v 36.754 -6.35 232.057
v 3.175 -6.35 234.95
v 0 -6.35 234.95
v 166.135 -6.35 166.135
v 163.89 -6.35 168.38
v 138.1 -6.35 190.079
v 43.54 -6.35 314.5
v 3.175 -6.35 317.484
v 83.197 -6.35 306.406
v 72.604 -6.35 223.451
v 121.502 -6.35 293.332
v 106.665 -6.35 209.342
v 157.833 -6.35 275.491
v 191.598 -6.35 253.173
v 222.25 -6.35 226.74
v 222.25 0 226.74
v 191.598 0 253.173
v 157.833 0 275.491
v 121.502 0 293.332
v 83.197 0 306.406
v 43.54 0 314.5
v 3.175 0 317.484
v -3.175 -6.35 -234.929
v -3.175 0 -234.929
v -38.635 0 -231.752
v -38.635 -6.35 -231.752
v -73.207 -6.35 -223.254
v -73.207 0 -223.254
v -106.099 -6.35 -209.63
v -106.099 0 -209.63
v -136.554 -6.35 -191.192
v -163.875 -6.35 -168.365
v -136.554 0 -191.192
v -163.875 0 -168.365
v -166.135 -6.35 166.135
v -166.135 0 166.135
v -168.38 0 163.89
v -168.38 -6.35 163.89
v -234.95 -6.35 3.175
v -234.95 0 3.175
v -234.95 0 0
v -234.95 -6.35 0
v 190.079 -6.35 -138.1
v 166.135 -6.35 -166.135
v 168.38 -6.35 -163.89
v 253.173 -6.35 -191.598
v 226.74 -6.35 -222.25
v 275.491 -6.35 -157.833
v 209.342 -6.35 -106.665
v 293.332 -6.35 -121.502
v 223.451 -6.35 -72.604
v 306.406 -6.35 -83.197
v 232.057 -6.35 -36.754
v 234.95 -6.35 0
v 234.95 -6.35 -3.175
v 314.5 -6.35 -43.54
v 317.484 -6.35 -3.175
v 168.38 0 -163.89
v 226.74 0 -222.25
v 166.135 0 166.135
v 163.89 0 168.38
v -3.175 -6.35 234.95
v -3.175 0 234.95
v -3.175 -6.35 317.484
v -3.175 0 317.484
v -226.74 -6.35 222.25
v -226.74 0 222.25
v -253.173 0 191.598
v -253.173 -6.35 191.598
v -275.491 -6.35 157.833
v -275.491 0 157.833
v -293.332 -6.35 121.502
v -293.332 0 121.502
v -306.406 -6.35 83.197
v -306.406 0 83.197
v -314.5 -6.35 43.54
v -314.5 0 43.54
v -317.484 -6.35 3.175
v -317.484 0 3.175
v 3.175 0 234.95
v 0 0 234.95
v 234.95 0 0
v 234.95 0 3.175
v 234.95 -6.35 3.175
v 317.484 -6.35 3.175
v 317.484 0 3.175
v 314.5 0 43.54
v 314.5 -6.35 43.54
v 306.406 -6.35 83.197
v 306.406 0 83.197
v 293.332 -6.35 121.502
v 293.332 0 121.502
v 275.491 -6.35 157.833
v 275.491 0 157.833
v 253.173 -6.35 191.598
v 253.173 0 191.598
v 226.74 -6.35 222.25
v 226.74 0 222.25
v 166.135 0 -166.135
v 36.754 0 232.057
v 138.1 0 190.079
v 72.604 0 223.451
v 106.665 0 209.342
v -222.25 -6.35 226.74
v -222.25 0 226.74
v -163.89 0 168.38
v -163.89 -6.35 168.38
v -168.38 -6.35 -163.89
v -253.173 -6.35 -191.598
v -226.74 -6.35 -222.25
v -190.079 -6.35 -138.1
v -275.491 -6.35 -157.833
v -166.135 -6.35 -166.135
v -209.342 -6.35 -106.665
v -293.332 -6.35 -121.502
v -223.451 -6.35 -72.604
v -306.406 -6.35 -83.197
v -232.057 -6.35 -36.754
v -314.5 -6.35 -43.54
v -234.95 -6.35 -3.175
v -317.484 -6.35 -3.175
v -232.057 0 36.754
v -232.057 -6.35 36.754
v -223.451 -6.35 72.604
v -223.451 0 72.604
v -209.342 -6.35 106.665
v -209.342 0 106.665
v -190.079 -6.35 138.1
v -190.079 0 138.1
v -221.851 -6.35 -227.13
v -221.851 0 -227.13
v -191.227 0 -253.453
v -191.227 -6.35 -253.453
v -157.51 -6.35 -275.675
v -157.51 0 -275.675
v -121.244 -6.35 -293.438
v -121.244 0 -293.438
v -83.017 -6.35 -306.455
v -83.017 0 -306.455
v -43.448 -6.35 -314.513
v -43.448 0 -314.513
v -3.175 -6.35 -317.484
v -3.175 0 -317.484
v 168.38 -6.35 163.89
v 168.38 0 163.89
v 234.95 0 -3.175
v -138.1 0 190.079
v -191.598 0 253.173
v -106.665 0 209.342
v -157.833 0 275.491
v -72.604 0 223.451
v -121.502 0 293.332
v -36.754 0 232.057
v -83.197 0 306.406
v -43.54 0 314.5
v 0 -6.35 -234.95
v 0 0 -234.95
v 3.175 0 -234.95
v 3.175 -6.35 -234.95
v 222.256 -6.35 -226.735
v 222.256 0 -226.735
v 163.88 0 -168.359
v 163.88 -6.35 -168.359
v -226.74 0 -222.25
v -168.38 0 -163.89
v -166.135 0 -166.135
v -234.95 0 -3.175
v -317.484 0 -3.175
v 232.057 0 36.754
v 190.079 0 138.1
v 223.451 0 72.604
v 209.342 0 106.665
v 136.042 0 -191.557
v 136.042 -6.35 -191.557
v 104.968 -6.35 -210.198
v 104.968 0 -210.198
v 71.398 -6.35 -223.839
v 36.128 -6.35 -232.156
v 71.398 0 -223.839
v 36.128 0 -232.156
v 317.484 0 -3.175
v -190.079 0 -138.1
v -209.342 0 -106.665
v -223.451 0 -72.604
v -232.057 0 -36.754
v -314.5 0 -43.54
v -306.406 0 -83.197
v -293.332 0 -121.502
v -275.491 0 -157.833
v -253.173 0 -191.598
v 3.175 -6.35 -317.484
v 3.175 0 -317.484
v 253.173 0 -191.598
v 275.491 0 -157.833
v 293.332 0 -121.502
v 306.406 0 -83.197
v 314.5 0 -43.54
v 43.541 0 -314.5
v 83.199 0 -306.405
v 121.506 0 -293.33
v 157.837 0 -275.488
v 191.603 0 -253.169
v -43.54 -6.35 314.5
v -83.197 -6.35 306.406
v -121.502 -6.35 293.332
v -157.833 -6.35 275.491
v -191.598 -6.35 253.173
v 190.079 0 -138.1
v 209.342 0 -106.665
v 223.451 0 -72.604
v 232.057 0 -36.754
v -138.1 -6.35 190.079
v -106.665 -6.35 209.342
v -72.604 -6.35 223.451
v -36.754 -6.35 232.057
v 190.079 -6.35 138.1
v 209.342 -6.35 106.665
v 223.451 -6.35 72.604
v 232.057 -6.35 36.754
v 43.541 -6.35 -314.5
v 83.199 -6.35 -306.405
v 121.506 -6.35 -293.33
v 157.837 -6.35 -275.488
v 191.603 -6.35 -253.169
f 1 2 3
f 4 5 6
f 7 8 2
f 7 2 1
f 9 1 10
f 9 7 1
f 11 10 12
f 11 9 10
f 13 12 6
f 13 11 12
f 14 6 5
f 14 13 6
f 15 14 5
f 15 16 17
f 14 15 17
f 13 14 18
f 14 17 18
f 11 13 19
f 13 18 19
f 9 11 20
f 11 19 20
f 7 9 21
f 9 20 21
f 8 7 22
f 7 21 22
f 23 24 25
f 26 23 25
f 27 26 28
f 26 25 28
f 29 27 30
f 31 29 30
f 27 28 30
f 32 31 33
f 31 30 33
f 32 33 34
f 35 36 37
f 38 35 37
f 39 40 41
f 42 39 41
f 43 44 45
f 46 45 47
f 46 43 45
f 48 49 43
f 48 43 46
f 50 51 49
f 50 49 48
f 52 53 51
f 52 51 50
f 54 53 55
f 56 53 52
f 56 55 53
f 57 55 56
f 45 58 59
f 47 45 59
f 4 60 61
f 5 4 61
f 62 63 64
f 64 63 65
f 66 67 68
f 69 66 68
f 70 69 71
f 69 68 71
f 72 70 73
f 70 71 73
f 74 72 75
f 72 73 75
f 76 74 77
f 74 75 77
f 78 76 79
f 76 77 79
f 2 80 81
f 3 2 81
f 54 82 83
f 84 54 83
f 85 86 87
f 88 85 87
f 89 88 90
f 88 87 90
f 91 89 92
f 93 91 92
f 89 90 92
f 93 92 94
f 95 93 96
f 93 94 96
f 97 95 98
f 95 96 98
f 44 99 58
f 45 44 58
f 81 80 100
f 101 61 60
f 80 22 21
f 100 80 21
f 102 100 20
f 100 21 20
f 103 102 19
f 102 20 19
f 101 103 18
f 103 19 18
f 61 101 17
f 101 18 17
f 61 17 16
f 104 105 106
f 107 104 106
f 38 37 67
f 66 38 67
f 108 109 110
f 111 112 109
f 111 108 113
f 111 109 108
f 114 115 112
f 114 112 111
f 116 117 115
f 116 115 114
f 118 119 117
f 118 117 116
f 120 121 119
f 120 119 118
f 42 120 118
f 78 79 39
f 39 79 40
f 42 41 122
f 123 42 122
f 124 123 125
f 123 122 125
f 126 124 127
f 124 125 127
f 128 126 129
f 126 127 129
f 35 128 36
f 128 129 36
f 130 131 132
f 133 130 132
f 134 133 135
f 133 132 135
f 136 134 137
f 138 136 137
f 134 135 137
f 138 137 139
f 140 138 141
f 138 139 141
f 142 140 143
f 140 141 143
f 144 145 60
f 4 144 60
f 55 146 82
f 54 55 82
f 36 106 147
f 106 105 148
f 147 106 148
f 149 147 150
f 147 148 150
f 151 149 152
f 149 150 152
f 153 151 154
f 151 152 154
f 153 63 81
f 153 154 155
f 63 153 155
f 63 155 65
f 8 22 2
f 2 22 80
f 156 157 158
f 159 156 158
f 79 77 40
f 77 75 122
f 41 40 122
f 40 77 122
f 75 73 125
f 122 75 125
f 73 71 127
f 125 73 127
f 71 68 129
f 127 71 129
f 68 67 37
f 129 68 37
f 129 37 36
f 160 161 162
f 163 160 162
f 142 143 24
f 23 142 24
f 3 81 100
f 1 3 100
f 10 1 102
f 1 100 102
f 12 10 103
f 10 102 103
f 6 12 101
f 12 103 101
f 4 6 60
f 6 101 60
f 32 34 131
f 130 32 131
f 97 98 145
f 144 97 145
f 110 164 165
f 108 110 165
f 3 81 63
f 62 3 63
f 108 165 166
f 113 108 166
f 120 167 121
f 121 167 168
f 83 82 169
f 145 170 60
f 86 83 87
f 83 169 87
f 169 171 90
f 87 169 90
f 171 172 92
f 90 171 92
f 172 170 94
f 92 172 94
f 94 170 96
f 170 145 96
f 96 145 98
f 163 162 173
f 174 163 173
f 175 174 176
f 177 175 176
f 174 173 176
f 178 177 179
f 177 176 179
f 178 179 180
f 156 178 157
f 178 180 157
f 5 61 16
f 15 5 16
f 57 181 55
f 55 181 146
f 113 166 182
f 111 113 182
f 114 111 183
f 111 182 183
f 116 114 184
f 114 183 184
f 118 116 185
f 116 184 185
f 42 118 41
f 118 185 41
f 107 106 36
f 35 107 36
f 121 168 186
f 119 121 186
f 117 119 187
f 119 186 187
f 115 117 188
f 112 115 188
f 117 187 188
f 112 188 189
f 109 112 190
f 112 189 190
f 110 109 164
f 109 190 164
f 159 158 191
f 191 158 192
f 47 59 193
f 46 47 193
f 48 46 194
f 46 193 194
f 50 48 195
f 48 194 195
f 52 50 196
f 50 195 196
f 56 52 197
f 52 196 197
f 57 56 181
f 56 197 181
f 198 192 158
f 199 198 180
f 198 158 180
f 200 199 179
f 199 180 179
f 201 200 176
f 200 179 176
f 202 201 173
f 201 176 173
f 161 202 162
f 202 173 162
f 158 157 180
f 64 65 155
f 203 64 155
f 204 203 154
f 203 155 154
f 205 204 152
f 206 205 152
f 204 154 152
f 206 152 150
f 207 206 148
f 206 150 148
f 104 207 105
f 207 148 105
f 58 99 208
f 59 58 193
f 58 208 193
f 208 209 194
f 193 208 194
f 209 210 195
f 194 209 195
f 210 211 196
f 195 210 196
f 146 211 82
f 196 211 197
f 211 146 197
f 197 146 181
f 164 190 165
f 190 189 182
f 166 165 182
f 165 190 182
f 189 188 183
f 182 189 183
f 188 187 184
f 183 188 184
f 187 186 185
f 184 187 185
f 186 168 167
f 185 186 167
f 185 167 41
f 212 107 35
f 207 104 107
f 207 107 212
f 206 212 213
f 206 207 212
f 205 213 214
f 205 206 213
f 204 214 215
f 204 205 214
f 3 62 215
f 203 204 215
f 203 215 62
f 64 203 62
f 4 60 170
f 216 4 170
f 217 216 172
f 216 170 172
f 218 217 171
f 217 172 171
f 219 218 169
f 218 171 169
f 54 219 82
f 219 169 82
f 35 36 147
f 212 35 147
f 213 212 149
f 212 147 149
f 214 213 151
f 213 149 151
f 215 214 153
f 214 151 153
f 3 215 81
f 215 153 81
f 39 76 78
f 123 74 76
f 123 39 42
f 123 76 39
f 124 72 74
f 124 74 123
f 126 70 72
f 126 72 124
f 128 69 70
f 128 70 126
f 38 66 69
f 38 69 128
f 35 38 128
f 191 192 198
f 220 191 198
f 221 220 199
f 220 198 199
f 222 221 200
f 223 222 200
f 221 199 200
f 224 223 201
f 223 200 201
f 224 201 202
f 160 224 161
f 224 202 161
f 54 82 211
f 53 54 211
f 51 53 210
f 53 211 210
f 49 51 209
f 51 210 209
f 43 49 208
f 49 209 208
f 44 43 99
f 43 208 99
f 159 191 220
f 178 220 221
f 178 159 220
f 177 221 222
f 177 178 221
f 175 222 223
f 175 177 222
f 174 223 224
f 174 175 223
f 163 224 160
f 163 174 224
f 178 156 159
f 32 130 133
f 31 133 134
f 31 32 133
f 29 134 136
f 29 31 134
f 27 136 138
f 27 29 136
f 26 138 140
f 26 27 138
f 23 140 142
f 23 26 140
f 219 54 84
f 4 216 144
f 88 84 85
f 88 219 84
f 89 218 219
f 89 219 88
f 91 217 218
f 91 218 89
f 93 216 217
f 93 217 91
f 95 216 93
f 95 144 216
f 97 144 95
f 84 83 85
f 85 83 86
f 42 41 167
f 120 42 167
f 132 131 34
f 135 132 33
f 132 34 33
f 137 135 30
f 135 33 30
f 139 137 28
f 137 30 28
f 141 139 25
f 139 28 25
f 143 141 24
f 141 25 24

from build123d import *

# Parameters (mm, degrees)
F1_DEPTH = 6.35


with BuildPart() as f1:
    # F0 (on Front) → F1 (new body)
    with BuildSketch(Plane.XZ):
        with BuildLine():
            Line((234.95, -3.175), (234.95, 0))
            ThreePointArc((234.95, 0), (217.0654961635, -89.9114724342), (166.1347382398, -166.1347382398))
            Line((166.1347382398, -166.1347382398), (168.37980227, -163.8896742095))
            Line((168.37980227, -163.8896742095), (226.7402414562, -222.2501133957))
            ThreePointArc((226.7402414562, -222.2501133957), (293.3317515723, -121.5019897759), (317.4841246031, -3.175))
            Line((317.4841246031, -3.175), (234.95, -3.175))
        make_face()
    extrude(amount=F1_DEPTH)


with BuildPart() as f1b:
    # F0 (on Front) → F1, piece 2 (new body)
    with BuildSketch(Plane.XZ):
        with BuildLine():
            ThreePointArc((166.1347382398, 166.1347382398), (217.0654961635, 89.9114724342), (234.95, 0))
            Line((234.95, 0), (234.95, 3.175))
            Line((234.95, 3.175), (317.4841246031, 3.175))
            ThreePointArc((317.4841246031, 3.175), (293.3317515723, 121.5019897759), (226.7402414562, 222.2501133957))
            Line((226.7402414562, 222.2501133957), (168.37980227, 163.8896742095))
            Line((168.37980227, 163.8896742095), (166.1347382398, 166.1347382398))
        make_face()
    extrude(amount=F1_DEPTH)


with BuildPart() as f1c:
    # F0 (on Front) → F1, piece 3 (new body)
    with BuildSketch(Plane.XZ):
        with BuildLine():
            ThreePointArc((0, 234.95), (89.9114724342, 217.0654961635), (166.1347382398, 166.1347382398))
            Line((166.1347382398, 166.1347382398), (163.8896742095, 168.37980227))
            Line((163.8896742095, 168.37980227), (222.2501133957, 226.7402414562))
            ThreePointArc((222.2501133957, 226.7402414562), (121.5019897759, 293.3317515723), (3.175, 317.4841246031))
            Line((3.175, 317.4841246031), (3.175, 234.95))
            Line((3.175, 234.95), (0, 234.95))
        make_face()
    extrude(amount=F1_DEPTH)


with BuildPart() as f1d:
    # F0 (on Front) → F1, piece 4 (new body)
    with BuildSketch(Plane.XZ):
        with BuildLine():
            ThreePointArc((-166.1347382398, 166.1347382398), (-89.9114724342, 217.0654961635), (0, 234.95))
            Line((0, 234.95), (-3.175, 234.95))
            Line((-3.175, 234.95), (-3.175, 317.4841246031))
            ThreePointArc((-3.175, 317.4841246031), (-121.5019897759, 293.3317515723), (-222.2501133957, 226.7402414562))
            Line((-222.2501133957, 226.7402414562), (-163.8896742095, 168.37980227))
            Line((-163.8896742095, 168.37980227), (-166.1347382398, 166.1347382398))
        make_face()
    extrude(amount=F1_DEPTH)


with BuildPart() as f1e:
    # F0 (on Front) → F1, piece 5 (new body)
    with BuildSketch(Plane.XZ):
        with BuildLine():
            Line((222.2557078015, -226.7347577008), (163.8801180129, -168.3591679122))
            ThreePointArc((163.8801180129, -168.3591679122), (88.4463566209, -217.6665902257), (0, -234.95))
            Line((0, -234.95), (3.175, -234.95))
            Line((3.175, -234.95), (3.175, -317.4841246031))
            ThreePointArc((3.175, -317.4841246031), (121.505608526, -293.3302526108), (222.2557078015, -226.7347577008))
        make_face()
    extrude(amount=F1_DEPTH)


with BuildPart() as f1f:
    # F0 (on Front) → F1, piece 6 (new body)
    with BuildSketch(Plane.XZ):
        with BuildLine():
            ThreePointArc((-234.95, 0), (-217.0654961635, 89.9114724342), (-166.1347382398, 166.1347382398))
            Line((-166.1347382398, 166.1347382398), (-168.37980227, 163.8896742095))
            Line((-168.37980227, 163.8896742095), (-226.7402414562, 222.2501133957))
            ThreePointArc((-226.7402414562, 222.2501133957), (-293.3317515723, 121.5019897759), (-317.4841246031, 3.175))
            Line((-317.4841246031, 3.175), (-234.95, 3.175))
            Line((-234.95, 3.175), (-234.95, 0))
        make_face()
    extrude(amount=F1_DEPTH)


with BuildPart() as f1g:
    # F0 (on Front) → F1, piece 7 (new body)
    with BuildSketch(Plane.XZ):
        with BuildLine():
            ThreePointArc((-166.1347382398, -166.1347382398), (-217.0654961635, -89.9114724342), (-234.95, 0))
            Line((-234.95, 0), (-234.95, -3.175))
            Line((-234.95, -3.175), (-317.4841246031, -3.175))
            ThreePointArc((-317.4841246031, -3.175), (-293.3317515723, -121.5019897759), (-226.7402414562, -222.2501133957))
            Line((-226.7402414562, -222.2501133957), (-168.37980227, -163.8896742095))
            Line((-168.37980227, -163.8896742095), (-166.1347382398, -166.1347382398))
        make_face()
    extrude(amount=F1_DEPTH)


with BuildPart() as f1h:
    # F0 (on Front) → F1, piece 8 (new body)
    with BuildSketch(Plane.XZ):
        with BuildLine():
            Line((-3.1749275238, -317.4841253279), (-3.1749275238, -234.9285472973))
            ThreePointArc((-3.1749275238, -234.9285472973), (-89.9114724342, -217.0654961635), (-163.8745561064, -168.3645816701))
            Line((-163.8745561064, -168.3645816701), (-221.8514646433, -227.1303098127))
            ThreePointArc((-221.8514646433, -227.1303098127), (-121.2442670293, -293.4383712341), (-3.1749275238, -317.4841253279))
        make_face()
    extrude(amount=F1_DEPTH)


solid = Compound([f1.part, f1b.part, f1c.part, f1d.part, f1e.part, f1f.part, f1g.part, f1h.part])
